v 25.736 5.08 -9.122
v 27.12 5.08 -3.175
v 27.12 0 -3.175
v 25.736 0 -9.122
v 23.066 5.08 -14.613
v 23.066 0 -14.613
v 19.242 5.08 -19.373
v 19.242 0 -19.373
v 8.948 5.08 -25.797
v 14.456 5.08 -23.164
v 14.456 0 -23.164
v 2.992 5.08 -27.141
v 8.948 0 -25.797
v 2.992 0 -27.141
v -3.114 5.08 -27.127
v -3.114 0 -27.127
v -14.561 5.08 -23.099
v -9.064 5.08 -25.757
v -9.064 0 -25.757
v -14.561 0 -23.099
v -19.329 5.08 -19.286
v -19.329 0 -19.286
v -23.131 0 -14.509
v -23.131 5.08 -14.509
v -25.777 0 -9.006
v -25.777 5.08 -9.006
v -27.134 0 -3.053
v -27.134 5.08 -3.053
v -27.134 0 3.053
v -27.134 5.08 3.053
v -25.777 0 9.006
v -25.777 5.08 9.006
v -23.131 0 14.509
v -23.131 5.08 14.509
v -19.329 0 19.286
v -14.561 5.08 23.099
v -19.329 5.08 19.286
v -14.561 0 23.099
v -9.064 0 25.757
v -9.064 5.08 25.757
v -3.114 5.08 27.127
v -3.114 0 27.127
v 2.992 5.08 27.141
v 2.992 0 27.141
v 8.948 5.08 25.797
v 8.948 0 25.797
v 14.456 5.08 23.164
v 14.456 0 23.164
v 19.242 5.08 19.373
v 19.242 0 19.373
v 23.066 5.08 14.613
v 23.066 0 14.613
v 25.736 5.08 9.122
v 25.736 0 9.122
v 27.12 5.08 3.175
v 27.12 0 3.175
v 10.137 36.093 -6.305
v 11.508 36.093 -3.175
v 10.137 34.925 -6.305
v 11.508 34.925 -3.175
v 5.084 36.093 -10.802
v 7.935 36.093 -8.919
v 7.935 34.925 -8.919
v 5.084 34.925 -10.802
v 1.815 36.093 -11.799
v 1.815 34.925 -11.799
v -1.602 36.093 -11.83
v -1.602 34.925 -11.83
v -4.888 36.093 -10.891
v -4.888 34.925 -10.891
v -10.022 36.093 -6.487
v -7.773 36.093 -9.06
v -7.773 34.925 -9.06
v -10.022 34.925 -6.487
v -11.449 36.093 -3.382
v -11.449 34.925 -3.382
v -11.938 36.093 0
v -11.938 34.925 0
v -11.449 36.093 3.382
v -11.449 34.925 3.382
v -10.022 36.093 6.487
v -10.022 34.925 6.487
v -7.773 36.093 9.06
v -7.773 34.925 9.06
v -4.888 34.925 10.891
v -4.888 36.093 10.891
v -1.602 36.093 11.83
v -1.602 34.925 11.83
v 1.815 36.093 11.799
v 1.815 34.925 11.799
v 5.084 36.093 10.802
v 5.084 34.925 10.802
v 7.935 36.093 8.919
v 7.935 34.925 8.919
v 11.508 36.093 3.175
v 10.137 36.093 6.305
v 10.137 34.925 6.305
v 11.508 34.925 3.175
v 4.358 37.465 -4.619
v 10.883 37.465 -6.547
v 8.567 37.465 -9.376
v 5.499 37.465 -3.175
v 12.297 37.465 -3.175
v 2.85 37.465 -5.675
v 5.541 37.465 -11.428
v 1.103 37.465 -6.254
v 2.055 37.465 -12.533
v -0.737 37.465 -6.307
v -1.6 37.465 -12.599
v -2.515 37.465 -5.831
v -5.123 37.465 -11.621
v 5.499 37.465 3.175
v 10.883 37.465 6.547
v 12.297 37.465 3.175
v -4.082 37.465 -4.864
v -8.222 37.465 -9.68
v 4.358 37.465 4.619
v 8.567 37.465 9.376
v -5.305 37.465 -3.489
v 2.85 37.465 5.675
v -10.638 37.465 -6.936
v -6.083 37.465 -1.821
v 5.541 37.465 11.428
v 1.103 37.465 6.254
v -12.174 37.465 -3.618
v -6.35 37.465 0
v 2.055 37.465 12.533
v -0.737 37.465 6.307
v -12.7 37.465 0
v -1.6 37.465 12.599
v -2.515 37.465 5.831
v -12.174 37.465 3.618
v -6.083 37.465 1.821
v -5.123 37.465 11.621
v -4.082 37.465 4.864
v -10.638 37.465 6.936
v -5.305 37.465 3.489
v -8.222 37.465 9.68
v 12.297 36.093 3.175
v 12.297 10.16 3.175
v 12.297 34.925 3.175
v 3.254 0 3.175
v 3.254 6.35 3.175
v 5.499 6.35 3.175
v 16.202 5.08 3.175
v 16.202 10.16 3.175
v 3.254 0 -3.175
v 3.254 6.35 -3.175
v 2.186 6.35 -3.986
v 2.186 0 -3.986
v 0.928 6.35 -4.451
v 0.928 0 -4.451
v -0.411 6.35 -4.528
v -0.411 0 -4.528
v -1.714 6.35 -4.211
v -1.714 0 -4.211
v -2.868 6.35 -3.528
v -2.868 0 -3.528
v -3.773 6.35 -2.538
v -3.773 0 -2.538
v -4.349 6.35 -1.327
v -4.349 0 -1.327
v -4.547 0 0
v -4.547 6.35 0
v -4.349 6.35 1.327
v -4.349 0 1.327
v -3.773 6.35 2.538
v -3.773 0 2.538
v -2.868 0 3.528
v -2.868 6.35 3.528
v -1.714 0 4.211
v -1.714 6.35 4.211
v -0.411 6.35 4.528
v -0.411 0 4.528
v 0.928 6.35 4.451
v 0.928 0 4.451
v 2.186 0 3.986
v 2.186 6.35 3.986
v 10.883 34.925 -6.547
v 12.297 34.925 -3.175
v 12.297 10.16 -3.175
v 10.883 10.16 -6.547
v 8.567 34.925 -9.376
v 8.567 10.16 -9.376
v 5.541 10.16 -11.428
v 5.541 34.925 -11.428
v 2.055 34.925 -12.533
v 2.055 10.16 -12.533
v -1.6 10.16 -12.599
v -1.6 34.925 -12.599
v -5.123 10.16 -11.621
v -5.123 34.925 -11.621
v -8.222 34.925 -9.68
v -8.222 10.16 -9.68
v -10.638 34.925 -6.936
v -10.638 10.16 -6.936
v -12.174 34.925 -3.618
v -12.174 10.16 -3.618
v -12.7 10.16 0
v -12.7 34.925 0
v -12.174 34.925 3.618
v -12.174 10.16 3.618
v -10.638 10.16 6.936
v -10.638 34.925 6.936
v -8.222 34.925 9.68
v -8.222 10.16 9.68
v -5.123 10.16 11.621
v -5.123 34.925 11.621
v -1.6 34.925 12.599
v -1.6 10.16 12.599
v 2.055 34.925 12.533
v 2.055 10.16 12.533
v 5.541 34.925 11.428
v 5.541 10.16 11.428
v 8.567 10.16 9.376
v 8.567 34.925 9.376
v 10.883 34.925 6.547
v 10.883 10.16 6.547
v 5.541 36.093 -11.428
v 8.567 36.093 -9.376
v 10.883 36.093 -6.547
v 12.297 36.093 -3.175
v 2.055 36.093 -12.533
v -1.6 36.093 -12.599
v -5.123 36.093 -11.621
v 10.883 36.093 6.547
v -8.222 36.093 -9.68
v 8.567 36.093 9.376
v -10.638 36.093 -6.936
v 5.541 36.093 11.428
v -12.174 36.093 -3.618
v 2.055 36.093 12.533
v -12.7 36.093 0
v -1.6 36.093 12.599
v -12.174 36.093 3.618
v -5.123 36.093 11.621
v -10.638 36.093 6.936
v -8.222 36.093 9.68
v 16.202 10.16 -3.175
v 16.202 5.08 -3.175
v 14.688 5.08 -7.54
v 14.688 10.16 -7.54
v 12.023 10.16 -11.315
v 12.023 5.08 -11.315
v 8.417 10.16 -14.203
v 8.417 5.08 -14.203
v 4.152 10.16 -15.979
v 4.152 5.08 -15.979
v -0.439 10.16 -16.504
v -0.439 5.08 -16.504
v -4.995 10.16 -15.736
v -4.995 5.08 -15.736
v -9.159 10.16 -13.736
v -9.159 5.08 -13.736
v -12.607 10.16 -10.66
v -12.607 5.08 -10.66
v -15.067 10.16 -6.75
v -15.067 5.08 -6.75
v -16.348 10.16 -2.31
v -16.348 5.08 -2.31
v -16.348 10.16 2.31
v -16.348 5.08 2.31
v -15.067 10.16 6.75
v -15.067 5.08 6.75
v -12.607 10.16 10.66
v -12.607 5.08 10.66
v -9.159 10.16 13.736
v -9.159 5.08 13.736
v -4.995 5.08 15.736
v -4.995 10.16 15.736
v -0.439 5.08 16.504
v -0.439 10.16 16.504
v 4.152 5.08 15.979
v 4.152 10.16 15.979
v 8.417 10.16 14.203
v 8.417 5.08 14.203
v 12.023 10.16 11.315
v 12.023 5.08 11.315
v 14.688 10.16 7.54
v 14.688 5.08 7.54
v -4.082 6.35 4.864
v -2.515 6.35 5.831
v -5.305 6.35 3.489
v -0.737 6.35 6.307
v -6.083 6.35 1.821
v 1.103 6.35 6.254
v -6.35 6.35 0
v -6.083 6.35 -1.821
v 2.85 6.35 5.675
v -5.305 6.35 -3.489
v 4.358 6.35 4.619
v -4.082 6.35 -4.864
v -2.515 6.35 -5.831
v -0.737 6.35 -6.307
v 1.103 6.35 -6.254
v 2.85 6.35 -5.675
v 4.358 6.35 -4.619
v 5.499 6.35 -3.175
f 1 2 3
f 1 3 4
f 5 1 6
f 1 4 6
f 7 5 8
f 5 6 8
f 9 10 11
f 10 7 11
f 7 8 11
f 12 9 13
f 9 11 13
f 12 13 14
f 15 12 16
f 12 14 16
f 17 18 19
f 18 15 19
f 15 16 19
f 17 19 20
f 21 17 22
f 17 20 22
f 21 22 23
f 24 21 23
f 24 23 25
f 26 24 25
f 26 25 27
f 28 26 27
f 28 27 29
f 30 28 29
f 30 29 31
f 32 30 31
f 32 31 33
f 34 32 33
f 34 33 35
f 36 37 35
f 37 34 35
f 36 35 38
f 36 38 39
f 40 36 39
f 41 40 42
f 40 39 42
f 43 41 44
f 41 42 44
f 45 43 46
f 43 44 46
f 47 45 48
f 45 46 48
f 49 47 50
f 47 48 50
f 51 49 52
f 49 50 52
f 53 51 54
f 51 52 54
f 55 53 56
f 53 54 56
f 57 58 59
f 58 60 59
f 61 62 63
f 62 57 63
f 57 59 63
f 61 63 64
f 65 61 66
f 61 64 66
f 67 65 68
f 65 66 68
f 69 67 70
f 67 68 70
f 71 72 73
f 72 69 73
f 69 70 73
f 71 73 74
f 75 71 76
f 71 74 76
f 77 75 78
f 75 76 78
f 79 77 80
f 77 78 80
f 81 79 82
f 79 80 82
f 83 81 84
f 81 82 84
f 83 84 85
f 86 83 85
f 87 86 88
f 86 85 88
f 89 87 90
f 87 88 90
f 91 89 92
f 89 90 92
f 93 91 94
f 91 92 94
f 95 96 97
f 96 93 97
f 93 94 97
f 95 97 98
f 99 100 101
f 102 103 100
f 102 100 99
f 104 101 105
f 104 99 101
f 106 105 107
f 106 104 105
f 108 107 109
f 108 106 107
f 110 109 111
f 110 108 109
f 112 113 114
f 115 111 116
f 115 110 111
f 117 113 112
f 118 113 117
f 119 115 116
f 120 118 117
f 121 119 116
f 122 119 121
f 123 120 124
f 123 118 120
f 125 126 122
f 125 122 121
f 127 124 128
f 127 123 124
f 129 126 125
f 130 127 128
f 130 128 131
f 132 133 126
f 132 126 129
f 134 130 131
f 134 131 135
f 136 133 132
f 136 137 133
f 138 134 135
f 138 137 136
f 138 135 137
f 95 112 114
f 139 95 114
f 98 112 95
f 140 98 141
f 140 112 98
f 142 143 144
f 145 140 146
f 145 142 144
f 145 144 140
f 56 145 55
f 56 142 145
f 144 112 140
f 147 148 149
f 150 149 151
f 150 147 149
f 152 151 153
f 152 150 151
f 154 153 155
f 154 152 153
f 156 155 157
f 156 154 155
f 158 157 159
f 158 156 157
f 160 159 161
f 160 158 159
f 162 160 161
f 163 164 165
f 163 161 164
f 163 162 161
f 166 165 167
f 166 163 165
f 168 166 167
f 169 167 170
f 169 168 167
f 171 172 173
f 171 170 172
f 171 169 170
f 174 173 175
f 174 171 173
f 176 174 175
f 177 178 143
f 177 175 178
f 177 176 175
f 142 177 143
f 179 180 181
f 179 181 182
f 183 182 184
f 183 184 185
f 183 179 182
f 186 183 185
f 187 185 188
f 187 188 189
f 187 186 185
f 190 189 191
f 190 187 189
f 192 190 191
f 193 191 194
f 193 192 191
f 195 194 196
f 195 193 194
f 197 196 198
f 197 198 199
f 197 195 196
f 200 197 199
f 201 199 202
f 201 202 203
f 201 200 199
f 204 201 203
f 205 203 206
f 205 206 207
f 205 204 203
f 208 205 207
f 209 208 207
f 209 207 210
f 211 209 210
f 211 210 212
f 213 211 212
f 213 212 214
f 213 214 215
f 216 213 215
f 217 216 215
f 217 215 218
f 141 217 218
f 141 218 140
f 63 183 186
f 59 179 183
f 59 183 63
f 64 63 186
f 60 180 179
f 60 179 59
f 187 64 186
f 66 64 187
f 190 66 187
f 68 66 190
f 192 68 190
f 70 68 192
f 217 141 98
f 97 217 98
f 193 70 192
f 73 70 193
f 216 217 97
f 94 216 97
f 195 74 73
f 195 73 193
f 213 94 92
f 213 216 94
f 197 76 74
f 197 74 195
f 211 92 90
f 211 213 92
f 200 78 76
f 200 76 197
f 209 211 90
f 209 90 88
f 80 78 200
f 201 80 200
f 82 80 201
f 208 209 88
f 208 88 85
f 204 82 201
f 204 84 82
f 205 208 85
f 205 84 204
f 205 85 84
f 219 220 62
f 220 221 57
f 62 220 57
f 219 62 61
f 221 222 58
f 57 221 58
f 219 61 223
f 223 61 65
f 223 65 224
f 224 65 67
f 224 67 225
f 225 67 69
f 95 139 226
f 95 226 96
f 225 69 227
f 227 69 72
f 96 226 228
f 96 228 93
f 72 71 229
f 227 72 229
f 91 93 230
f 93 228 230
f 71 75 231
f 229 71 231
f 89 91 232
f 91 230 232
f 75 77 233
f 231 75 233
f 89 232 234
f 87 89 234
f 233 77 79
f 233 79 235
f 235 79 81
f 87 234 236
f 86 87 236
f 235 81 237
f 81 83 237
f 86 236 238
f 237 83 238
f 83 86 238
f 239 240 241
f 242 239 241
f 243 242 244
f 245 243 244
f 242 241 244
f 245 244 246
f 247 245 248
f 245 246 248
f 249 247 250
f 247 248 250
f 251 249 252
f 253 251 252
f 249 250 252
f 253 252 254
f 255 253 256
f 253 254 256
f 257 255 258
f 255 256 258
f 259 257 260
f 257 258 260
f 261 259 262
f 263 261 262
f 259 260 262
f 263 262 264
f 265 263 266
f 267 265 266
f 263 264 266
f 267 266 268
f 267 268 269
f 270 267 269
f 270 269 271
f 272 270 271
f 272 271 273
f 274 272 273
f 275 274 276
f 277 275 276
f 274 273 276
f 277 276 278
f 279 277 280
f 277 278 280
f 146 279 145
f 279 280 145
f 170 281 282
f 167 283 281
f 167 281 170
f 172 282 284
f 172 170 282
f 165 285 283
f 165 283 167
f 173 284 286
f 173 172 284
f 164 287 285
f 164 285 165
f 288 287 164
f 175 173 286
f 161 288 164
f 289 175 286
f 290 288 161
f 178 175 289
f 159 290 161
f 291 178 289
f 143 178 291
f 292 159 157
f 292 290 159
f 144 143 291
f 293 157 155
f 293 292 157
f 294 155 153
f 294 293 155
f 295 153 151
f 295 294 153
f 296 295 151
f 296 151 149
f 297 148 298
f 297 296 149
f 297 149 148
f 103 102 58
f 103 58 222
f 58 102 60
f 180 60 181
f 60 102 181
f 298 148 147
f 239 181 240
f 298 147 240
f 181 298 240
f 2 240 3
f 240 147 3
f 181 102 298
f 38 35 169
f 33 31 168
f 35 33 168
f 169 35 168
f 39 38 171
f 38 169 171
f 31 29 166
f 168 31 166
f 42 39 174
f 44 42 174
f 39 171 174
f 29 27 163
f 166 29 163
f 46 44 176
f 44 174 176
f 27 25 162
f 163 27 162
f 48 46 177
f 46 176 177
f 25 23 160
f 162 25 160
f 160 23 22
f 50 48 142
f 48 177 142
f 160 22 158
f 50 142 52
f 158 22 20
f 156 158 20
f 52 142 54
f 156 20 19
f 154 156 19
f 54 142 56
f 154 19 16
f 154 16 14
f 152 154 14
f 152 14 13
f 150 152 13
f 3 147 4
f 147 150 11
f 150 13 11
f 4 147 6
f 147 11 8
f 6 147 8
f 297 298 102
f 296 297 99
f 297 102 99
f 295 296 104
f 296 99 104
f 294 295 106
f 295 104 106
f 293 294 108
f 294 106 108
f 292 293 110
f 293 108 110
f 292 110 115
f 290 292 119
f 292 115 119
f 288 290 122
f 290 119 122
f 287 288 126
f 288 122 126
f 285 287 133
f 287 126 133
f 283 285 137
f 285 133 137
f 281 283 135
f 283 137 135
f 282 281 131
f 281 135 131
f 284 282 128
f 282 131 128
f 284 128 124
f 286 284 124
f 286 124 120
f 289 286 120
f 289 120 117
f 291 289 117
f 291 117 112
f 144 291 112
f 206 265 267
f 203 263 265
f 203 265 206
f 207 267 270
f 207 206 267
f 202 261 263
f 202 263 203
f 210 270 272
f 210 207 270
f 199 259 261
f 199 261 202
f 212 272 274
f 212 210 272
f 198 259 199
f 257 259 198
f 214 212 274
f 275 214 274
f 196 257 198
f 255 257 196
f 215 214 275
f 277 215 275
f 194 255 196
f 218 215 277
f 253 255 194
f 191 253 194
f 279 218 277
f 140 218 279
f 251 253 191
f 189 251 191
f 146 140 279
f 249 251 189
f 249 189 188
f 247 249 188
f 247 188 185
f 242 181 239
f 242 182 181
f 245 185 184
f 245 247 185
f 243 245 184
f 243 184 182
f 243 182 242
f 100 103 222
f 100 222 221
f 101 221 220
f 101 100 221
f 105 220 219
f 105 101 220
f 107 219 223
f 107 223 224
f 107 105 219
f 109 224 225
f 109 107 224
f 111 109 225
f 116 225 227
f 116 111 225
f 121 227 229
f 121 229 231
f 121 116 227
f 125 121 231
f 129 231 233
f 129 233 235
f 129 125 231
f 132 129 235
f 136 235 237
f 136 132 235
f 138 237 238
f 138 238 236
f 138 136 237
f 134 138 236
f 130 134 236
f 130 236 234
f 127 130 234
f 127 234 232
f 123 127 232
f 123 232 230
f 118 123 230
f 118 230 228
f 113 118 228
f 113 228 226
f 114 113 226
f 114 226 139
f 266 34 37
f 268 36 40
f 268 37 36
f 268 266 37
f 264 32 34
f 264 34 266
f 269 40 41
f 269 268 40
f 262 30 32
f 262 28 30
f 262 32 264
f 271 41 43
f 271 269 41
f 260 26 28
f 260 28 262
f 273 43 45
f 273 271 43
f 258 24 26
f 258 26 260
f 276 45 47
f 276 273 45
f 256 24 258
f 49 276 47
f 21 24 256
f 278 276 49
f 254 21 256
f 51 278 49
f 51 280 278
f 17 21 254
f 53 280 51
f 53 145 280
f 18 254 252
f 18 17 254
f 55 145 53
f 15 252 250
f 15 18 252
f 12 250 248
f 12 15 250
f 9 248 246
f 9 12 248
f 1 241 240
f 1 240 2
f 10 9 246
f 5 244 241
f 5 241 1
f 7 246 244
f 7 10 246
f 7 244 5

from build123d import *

# Parameters (mm, degrees)
SKETCH1_R           = 27.305
SKETCH1_R_2         = 4.5466
BOSS_EXTRUDE1_DEPTH = 50.8
SKETCH2_R           = 6.35
CUT_EXTRUDE1_DEPTH  = 44.45
SKETCH3_OUTSIDE_W   = 75.098
SKETCH3_OUTSIDE_H   = 75.098
SKETCH3_OUTSIDE_R   = 12.7
CUT_EXTRUDE2_DEPTH  = 44.45
SKETCH10_W          = 30.679481275
SKETCH10_H          = 6.35
CUT_EXTRUDE7_DEPTH  = 6.35
SKETCH13_OUTSIDE_W  = 74.891
SKETCH13_OUTSIDE_H  = 75.076
SKETCH13_OUTSIDE_R  = 11.938
CUT_EXTRUDE9_DEPTH  = 1.1684
SKETCH16_R          = 46.08237905
CUT_EXTRUDE11_DEPTH = 54.802902106
BOSS_EXTRUDE4_START = 3.81
SKETCH18_R          = 16.51
SKETCH18_R_2        = 12.7
BOSS_EXTRUDE4_DEPTH = 3.81
SKETCH19_OUTSIDE_W  = 73.569
SKETCH19_OUTSIDE_H  = 73.754
SKETCH19_OUTSIDE_R  = 16.51
CUT_EXTRUDE12_DEPTH = 1.27
SKETCH10_2_W        = 30.679481275
SKETCH10_2_H        = 6.35
CUT_EXTRUDE13_DEPTH = 54.802902106


with BuildPart() as part:
    # Sketch1 → Boss-Extrude1 (new body)
    with BuildSketch(Plane(origin=(0, 0, 0), x_dir=(1, 0, 0), z_dir=(0, 1, 0))):
        Circle(SKETCH1_R)
        Circle(SKETCH1_R_2, mode=Mode.SUBTRACT)
    extrude(amount=BOSS_EXTRUDE1_DEPTH)

    # Sketch2 → Cut-Extrude1 (cut)
    with BuildSketch(Plane(origin=(0, 50.8, 0), x_dir=(1, 0, 0), z_dir=(0, 1, 0))):
        Circle(SKETCH2_R)
    extrude(amount=-CUT_EXTRUDE1_DEPTH, mode=Mode.SUBTRACT)

    # Sketch3 outside → Cut-Extrude2 (cut)
    with BuildSketch(Plane(origin=(0, 50.8, 0), x_dir=(1, 0, 0), z_dir=(0, 1, 0))):
        Rectangle(SKETCH3_OUTSIDE_W, SKETCH3_OUTSIDE_H)
        Circle(SKETCH3_OUTSIDE_R, mode=Mode.SUBTRACT)
    extrude(amount=-CUT_EXTRUDE2_DEPTH, mode=Mode.SUBTRACT)

    # Sketch10 → Cut-Extrude7 (cut)
    with BuildSketch(Plane.XZ):
        with Locations((17.839550223, 0)):
            Rectangle(SKETCH10_W, SKETCH10_H)
    extrude(amount=-CUT_EXTRUDE7_DEPTH, mode=Mode.SUBTRACT)

    # Sketch13 outside → Cut-Extrude9 (cut)
    with BuildSketch(Plane(origin=(0, 34.925, 0), x_dir=(-1, 0, 0), z_dir=(0, 1, 0))):
        with Locations((0.0925, 0)):
            Rectangle(SKETCH13_OUTSIDE_W, SKETCH13_OUTSIDE_H)
        Circle(SKETCH13_OUTSIDE_R, mode=Mode.SUBTRACT)
    extrude(amount=CUT_EXTRUDE9_DEPTH, mode=Mode.SUBTRACT)

    # Sketch16 → Cut-Extrude11 (cut, through all)
    with BuildSketch(Plane(origin=(0, 37.465, 0), x_dir=(-1, 0, 0), z_dir=(0, 1, 0))):
        Circle(SKETCH16_R)
    extrude(amount=CUT_EXTRUDE11_DEPTH, mode=Mode.SUBTRACT)

    # Sketch18 → Boss-Extrude4 (add)
    with BuildSketch(Plane(origin=(0, 6.35, 0), x_dir=(1, 0, 0), z_dir=(0, 1, 0)).offset(BOSS_EXTRUDE4_START)):
        Circle(SKETCH18_R)
        Circle(SKETCH18_R_2, mode=Mode.SUBTRACT)
    extrude(amount=-BOSS_EXTRUDE4_DEPTH)

    # Sketch19 outside → Cut-Extrude12 (cut)
    with BuildSketch(Plane(origin=(0, 6.35, 0), x_dir=(1, 0, 0), z_dir=(0, 1, 0))):
        with Locations((-0.0925, 0)):
            Rectangle(SKETCH19_OUTSIDE_W, SKETCH19_OUTSIDE_H)
        Circle(SKETCH19_OUTSIDE_R, mode=Mode.SUBTRACT)
    extrude(amount=-CUT_EXTRUDE12_DEPTH, mode=Mode.SUBTRACT)

    # Sketch10<2> → Cut-Extrude13 (cut, through all)
    with BuildSketch(Plane.XZ):
        with Locations((17.839550223, 0)):
            Rectangle(SKETCH10_2_W, SKETCH10_2_H)
    extrude(amount=-CUT_EXTRUDE13_DEPTH, mode=Mode.SUBTRACT)


solid = part.part
